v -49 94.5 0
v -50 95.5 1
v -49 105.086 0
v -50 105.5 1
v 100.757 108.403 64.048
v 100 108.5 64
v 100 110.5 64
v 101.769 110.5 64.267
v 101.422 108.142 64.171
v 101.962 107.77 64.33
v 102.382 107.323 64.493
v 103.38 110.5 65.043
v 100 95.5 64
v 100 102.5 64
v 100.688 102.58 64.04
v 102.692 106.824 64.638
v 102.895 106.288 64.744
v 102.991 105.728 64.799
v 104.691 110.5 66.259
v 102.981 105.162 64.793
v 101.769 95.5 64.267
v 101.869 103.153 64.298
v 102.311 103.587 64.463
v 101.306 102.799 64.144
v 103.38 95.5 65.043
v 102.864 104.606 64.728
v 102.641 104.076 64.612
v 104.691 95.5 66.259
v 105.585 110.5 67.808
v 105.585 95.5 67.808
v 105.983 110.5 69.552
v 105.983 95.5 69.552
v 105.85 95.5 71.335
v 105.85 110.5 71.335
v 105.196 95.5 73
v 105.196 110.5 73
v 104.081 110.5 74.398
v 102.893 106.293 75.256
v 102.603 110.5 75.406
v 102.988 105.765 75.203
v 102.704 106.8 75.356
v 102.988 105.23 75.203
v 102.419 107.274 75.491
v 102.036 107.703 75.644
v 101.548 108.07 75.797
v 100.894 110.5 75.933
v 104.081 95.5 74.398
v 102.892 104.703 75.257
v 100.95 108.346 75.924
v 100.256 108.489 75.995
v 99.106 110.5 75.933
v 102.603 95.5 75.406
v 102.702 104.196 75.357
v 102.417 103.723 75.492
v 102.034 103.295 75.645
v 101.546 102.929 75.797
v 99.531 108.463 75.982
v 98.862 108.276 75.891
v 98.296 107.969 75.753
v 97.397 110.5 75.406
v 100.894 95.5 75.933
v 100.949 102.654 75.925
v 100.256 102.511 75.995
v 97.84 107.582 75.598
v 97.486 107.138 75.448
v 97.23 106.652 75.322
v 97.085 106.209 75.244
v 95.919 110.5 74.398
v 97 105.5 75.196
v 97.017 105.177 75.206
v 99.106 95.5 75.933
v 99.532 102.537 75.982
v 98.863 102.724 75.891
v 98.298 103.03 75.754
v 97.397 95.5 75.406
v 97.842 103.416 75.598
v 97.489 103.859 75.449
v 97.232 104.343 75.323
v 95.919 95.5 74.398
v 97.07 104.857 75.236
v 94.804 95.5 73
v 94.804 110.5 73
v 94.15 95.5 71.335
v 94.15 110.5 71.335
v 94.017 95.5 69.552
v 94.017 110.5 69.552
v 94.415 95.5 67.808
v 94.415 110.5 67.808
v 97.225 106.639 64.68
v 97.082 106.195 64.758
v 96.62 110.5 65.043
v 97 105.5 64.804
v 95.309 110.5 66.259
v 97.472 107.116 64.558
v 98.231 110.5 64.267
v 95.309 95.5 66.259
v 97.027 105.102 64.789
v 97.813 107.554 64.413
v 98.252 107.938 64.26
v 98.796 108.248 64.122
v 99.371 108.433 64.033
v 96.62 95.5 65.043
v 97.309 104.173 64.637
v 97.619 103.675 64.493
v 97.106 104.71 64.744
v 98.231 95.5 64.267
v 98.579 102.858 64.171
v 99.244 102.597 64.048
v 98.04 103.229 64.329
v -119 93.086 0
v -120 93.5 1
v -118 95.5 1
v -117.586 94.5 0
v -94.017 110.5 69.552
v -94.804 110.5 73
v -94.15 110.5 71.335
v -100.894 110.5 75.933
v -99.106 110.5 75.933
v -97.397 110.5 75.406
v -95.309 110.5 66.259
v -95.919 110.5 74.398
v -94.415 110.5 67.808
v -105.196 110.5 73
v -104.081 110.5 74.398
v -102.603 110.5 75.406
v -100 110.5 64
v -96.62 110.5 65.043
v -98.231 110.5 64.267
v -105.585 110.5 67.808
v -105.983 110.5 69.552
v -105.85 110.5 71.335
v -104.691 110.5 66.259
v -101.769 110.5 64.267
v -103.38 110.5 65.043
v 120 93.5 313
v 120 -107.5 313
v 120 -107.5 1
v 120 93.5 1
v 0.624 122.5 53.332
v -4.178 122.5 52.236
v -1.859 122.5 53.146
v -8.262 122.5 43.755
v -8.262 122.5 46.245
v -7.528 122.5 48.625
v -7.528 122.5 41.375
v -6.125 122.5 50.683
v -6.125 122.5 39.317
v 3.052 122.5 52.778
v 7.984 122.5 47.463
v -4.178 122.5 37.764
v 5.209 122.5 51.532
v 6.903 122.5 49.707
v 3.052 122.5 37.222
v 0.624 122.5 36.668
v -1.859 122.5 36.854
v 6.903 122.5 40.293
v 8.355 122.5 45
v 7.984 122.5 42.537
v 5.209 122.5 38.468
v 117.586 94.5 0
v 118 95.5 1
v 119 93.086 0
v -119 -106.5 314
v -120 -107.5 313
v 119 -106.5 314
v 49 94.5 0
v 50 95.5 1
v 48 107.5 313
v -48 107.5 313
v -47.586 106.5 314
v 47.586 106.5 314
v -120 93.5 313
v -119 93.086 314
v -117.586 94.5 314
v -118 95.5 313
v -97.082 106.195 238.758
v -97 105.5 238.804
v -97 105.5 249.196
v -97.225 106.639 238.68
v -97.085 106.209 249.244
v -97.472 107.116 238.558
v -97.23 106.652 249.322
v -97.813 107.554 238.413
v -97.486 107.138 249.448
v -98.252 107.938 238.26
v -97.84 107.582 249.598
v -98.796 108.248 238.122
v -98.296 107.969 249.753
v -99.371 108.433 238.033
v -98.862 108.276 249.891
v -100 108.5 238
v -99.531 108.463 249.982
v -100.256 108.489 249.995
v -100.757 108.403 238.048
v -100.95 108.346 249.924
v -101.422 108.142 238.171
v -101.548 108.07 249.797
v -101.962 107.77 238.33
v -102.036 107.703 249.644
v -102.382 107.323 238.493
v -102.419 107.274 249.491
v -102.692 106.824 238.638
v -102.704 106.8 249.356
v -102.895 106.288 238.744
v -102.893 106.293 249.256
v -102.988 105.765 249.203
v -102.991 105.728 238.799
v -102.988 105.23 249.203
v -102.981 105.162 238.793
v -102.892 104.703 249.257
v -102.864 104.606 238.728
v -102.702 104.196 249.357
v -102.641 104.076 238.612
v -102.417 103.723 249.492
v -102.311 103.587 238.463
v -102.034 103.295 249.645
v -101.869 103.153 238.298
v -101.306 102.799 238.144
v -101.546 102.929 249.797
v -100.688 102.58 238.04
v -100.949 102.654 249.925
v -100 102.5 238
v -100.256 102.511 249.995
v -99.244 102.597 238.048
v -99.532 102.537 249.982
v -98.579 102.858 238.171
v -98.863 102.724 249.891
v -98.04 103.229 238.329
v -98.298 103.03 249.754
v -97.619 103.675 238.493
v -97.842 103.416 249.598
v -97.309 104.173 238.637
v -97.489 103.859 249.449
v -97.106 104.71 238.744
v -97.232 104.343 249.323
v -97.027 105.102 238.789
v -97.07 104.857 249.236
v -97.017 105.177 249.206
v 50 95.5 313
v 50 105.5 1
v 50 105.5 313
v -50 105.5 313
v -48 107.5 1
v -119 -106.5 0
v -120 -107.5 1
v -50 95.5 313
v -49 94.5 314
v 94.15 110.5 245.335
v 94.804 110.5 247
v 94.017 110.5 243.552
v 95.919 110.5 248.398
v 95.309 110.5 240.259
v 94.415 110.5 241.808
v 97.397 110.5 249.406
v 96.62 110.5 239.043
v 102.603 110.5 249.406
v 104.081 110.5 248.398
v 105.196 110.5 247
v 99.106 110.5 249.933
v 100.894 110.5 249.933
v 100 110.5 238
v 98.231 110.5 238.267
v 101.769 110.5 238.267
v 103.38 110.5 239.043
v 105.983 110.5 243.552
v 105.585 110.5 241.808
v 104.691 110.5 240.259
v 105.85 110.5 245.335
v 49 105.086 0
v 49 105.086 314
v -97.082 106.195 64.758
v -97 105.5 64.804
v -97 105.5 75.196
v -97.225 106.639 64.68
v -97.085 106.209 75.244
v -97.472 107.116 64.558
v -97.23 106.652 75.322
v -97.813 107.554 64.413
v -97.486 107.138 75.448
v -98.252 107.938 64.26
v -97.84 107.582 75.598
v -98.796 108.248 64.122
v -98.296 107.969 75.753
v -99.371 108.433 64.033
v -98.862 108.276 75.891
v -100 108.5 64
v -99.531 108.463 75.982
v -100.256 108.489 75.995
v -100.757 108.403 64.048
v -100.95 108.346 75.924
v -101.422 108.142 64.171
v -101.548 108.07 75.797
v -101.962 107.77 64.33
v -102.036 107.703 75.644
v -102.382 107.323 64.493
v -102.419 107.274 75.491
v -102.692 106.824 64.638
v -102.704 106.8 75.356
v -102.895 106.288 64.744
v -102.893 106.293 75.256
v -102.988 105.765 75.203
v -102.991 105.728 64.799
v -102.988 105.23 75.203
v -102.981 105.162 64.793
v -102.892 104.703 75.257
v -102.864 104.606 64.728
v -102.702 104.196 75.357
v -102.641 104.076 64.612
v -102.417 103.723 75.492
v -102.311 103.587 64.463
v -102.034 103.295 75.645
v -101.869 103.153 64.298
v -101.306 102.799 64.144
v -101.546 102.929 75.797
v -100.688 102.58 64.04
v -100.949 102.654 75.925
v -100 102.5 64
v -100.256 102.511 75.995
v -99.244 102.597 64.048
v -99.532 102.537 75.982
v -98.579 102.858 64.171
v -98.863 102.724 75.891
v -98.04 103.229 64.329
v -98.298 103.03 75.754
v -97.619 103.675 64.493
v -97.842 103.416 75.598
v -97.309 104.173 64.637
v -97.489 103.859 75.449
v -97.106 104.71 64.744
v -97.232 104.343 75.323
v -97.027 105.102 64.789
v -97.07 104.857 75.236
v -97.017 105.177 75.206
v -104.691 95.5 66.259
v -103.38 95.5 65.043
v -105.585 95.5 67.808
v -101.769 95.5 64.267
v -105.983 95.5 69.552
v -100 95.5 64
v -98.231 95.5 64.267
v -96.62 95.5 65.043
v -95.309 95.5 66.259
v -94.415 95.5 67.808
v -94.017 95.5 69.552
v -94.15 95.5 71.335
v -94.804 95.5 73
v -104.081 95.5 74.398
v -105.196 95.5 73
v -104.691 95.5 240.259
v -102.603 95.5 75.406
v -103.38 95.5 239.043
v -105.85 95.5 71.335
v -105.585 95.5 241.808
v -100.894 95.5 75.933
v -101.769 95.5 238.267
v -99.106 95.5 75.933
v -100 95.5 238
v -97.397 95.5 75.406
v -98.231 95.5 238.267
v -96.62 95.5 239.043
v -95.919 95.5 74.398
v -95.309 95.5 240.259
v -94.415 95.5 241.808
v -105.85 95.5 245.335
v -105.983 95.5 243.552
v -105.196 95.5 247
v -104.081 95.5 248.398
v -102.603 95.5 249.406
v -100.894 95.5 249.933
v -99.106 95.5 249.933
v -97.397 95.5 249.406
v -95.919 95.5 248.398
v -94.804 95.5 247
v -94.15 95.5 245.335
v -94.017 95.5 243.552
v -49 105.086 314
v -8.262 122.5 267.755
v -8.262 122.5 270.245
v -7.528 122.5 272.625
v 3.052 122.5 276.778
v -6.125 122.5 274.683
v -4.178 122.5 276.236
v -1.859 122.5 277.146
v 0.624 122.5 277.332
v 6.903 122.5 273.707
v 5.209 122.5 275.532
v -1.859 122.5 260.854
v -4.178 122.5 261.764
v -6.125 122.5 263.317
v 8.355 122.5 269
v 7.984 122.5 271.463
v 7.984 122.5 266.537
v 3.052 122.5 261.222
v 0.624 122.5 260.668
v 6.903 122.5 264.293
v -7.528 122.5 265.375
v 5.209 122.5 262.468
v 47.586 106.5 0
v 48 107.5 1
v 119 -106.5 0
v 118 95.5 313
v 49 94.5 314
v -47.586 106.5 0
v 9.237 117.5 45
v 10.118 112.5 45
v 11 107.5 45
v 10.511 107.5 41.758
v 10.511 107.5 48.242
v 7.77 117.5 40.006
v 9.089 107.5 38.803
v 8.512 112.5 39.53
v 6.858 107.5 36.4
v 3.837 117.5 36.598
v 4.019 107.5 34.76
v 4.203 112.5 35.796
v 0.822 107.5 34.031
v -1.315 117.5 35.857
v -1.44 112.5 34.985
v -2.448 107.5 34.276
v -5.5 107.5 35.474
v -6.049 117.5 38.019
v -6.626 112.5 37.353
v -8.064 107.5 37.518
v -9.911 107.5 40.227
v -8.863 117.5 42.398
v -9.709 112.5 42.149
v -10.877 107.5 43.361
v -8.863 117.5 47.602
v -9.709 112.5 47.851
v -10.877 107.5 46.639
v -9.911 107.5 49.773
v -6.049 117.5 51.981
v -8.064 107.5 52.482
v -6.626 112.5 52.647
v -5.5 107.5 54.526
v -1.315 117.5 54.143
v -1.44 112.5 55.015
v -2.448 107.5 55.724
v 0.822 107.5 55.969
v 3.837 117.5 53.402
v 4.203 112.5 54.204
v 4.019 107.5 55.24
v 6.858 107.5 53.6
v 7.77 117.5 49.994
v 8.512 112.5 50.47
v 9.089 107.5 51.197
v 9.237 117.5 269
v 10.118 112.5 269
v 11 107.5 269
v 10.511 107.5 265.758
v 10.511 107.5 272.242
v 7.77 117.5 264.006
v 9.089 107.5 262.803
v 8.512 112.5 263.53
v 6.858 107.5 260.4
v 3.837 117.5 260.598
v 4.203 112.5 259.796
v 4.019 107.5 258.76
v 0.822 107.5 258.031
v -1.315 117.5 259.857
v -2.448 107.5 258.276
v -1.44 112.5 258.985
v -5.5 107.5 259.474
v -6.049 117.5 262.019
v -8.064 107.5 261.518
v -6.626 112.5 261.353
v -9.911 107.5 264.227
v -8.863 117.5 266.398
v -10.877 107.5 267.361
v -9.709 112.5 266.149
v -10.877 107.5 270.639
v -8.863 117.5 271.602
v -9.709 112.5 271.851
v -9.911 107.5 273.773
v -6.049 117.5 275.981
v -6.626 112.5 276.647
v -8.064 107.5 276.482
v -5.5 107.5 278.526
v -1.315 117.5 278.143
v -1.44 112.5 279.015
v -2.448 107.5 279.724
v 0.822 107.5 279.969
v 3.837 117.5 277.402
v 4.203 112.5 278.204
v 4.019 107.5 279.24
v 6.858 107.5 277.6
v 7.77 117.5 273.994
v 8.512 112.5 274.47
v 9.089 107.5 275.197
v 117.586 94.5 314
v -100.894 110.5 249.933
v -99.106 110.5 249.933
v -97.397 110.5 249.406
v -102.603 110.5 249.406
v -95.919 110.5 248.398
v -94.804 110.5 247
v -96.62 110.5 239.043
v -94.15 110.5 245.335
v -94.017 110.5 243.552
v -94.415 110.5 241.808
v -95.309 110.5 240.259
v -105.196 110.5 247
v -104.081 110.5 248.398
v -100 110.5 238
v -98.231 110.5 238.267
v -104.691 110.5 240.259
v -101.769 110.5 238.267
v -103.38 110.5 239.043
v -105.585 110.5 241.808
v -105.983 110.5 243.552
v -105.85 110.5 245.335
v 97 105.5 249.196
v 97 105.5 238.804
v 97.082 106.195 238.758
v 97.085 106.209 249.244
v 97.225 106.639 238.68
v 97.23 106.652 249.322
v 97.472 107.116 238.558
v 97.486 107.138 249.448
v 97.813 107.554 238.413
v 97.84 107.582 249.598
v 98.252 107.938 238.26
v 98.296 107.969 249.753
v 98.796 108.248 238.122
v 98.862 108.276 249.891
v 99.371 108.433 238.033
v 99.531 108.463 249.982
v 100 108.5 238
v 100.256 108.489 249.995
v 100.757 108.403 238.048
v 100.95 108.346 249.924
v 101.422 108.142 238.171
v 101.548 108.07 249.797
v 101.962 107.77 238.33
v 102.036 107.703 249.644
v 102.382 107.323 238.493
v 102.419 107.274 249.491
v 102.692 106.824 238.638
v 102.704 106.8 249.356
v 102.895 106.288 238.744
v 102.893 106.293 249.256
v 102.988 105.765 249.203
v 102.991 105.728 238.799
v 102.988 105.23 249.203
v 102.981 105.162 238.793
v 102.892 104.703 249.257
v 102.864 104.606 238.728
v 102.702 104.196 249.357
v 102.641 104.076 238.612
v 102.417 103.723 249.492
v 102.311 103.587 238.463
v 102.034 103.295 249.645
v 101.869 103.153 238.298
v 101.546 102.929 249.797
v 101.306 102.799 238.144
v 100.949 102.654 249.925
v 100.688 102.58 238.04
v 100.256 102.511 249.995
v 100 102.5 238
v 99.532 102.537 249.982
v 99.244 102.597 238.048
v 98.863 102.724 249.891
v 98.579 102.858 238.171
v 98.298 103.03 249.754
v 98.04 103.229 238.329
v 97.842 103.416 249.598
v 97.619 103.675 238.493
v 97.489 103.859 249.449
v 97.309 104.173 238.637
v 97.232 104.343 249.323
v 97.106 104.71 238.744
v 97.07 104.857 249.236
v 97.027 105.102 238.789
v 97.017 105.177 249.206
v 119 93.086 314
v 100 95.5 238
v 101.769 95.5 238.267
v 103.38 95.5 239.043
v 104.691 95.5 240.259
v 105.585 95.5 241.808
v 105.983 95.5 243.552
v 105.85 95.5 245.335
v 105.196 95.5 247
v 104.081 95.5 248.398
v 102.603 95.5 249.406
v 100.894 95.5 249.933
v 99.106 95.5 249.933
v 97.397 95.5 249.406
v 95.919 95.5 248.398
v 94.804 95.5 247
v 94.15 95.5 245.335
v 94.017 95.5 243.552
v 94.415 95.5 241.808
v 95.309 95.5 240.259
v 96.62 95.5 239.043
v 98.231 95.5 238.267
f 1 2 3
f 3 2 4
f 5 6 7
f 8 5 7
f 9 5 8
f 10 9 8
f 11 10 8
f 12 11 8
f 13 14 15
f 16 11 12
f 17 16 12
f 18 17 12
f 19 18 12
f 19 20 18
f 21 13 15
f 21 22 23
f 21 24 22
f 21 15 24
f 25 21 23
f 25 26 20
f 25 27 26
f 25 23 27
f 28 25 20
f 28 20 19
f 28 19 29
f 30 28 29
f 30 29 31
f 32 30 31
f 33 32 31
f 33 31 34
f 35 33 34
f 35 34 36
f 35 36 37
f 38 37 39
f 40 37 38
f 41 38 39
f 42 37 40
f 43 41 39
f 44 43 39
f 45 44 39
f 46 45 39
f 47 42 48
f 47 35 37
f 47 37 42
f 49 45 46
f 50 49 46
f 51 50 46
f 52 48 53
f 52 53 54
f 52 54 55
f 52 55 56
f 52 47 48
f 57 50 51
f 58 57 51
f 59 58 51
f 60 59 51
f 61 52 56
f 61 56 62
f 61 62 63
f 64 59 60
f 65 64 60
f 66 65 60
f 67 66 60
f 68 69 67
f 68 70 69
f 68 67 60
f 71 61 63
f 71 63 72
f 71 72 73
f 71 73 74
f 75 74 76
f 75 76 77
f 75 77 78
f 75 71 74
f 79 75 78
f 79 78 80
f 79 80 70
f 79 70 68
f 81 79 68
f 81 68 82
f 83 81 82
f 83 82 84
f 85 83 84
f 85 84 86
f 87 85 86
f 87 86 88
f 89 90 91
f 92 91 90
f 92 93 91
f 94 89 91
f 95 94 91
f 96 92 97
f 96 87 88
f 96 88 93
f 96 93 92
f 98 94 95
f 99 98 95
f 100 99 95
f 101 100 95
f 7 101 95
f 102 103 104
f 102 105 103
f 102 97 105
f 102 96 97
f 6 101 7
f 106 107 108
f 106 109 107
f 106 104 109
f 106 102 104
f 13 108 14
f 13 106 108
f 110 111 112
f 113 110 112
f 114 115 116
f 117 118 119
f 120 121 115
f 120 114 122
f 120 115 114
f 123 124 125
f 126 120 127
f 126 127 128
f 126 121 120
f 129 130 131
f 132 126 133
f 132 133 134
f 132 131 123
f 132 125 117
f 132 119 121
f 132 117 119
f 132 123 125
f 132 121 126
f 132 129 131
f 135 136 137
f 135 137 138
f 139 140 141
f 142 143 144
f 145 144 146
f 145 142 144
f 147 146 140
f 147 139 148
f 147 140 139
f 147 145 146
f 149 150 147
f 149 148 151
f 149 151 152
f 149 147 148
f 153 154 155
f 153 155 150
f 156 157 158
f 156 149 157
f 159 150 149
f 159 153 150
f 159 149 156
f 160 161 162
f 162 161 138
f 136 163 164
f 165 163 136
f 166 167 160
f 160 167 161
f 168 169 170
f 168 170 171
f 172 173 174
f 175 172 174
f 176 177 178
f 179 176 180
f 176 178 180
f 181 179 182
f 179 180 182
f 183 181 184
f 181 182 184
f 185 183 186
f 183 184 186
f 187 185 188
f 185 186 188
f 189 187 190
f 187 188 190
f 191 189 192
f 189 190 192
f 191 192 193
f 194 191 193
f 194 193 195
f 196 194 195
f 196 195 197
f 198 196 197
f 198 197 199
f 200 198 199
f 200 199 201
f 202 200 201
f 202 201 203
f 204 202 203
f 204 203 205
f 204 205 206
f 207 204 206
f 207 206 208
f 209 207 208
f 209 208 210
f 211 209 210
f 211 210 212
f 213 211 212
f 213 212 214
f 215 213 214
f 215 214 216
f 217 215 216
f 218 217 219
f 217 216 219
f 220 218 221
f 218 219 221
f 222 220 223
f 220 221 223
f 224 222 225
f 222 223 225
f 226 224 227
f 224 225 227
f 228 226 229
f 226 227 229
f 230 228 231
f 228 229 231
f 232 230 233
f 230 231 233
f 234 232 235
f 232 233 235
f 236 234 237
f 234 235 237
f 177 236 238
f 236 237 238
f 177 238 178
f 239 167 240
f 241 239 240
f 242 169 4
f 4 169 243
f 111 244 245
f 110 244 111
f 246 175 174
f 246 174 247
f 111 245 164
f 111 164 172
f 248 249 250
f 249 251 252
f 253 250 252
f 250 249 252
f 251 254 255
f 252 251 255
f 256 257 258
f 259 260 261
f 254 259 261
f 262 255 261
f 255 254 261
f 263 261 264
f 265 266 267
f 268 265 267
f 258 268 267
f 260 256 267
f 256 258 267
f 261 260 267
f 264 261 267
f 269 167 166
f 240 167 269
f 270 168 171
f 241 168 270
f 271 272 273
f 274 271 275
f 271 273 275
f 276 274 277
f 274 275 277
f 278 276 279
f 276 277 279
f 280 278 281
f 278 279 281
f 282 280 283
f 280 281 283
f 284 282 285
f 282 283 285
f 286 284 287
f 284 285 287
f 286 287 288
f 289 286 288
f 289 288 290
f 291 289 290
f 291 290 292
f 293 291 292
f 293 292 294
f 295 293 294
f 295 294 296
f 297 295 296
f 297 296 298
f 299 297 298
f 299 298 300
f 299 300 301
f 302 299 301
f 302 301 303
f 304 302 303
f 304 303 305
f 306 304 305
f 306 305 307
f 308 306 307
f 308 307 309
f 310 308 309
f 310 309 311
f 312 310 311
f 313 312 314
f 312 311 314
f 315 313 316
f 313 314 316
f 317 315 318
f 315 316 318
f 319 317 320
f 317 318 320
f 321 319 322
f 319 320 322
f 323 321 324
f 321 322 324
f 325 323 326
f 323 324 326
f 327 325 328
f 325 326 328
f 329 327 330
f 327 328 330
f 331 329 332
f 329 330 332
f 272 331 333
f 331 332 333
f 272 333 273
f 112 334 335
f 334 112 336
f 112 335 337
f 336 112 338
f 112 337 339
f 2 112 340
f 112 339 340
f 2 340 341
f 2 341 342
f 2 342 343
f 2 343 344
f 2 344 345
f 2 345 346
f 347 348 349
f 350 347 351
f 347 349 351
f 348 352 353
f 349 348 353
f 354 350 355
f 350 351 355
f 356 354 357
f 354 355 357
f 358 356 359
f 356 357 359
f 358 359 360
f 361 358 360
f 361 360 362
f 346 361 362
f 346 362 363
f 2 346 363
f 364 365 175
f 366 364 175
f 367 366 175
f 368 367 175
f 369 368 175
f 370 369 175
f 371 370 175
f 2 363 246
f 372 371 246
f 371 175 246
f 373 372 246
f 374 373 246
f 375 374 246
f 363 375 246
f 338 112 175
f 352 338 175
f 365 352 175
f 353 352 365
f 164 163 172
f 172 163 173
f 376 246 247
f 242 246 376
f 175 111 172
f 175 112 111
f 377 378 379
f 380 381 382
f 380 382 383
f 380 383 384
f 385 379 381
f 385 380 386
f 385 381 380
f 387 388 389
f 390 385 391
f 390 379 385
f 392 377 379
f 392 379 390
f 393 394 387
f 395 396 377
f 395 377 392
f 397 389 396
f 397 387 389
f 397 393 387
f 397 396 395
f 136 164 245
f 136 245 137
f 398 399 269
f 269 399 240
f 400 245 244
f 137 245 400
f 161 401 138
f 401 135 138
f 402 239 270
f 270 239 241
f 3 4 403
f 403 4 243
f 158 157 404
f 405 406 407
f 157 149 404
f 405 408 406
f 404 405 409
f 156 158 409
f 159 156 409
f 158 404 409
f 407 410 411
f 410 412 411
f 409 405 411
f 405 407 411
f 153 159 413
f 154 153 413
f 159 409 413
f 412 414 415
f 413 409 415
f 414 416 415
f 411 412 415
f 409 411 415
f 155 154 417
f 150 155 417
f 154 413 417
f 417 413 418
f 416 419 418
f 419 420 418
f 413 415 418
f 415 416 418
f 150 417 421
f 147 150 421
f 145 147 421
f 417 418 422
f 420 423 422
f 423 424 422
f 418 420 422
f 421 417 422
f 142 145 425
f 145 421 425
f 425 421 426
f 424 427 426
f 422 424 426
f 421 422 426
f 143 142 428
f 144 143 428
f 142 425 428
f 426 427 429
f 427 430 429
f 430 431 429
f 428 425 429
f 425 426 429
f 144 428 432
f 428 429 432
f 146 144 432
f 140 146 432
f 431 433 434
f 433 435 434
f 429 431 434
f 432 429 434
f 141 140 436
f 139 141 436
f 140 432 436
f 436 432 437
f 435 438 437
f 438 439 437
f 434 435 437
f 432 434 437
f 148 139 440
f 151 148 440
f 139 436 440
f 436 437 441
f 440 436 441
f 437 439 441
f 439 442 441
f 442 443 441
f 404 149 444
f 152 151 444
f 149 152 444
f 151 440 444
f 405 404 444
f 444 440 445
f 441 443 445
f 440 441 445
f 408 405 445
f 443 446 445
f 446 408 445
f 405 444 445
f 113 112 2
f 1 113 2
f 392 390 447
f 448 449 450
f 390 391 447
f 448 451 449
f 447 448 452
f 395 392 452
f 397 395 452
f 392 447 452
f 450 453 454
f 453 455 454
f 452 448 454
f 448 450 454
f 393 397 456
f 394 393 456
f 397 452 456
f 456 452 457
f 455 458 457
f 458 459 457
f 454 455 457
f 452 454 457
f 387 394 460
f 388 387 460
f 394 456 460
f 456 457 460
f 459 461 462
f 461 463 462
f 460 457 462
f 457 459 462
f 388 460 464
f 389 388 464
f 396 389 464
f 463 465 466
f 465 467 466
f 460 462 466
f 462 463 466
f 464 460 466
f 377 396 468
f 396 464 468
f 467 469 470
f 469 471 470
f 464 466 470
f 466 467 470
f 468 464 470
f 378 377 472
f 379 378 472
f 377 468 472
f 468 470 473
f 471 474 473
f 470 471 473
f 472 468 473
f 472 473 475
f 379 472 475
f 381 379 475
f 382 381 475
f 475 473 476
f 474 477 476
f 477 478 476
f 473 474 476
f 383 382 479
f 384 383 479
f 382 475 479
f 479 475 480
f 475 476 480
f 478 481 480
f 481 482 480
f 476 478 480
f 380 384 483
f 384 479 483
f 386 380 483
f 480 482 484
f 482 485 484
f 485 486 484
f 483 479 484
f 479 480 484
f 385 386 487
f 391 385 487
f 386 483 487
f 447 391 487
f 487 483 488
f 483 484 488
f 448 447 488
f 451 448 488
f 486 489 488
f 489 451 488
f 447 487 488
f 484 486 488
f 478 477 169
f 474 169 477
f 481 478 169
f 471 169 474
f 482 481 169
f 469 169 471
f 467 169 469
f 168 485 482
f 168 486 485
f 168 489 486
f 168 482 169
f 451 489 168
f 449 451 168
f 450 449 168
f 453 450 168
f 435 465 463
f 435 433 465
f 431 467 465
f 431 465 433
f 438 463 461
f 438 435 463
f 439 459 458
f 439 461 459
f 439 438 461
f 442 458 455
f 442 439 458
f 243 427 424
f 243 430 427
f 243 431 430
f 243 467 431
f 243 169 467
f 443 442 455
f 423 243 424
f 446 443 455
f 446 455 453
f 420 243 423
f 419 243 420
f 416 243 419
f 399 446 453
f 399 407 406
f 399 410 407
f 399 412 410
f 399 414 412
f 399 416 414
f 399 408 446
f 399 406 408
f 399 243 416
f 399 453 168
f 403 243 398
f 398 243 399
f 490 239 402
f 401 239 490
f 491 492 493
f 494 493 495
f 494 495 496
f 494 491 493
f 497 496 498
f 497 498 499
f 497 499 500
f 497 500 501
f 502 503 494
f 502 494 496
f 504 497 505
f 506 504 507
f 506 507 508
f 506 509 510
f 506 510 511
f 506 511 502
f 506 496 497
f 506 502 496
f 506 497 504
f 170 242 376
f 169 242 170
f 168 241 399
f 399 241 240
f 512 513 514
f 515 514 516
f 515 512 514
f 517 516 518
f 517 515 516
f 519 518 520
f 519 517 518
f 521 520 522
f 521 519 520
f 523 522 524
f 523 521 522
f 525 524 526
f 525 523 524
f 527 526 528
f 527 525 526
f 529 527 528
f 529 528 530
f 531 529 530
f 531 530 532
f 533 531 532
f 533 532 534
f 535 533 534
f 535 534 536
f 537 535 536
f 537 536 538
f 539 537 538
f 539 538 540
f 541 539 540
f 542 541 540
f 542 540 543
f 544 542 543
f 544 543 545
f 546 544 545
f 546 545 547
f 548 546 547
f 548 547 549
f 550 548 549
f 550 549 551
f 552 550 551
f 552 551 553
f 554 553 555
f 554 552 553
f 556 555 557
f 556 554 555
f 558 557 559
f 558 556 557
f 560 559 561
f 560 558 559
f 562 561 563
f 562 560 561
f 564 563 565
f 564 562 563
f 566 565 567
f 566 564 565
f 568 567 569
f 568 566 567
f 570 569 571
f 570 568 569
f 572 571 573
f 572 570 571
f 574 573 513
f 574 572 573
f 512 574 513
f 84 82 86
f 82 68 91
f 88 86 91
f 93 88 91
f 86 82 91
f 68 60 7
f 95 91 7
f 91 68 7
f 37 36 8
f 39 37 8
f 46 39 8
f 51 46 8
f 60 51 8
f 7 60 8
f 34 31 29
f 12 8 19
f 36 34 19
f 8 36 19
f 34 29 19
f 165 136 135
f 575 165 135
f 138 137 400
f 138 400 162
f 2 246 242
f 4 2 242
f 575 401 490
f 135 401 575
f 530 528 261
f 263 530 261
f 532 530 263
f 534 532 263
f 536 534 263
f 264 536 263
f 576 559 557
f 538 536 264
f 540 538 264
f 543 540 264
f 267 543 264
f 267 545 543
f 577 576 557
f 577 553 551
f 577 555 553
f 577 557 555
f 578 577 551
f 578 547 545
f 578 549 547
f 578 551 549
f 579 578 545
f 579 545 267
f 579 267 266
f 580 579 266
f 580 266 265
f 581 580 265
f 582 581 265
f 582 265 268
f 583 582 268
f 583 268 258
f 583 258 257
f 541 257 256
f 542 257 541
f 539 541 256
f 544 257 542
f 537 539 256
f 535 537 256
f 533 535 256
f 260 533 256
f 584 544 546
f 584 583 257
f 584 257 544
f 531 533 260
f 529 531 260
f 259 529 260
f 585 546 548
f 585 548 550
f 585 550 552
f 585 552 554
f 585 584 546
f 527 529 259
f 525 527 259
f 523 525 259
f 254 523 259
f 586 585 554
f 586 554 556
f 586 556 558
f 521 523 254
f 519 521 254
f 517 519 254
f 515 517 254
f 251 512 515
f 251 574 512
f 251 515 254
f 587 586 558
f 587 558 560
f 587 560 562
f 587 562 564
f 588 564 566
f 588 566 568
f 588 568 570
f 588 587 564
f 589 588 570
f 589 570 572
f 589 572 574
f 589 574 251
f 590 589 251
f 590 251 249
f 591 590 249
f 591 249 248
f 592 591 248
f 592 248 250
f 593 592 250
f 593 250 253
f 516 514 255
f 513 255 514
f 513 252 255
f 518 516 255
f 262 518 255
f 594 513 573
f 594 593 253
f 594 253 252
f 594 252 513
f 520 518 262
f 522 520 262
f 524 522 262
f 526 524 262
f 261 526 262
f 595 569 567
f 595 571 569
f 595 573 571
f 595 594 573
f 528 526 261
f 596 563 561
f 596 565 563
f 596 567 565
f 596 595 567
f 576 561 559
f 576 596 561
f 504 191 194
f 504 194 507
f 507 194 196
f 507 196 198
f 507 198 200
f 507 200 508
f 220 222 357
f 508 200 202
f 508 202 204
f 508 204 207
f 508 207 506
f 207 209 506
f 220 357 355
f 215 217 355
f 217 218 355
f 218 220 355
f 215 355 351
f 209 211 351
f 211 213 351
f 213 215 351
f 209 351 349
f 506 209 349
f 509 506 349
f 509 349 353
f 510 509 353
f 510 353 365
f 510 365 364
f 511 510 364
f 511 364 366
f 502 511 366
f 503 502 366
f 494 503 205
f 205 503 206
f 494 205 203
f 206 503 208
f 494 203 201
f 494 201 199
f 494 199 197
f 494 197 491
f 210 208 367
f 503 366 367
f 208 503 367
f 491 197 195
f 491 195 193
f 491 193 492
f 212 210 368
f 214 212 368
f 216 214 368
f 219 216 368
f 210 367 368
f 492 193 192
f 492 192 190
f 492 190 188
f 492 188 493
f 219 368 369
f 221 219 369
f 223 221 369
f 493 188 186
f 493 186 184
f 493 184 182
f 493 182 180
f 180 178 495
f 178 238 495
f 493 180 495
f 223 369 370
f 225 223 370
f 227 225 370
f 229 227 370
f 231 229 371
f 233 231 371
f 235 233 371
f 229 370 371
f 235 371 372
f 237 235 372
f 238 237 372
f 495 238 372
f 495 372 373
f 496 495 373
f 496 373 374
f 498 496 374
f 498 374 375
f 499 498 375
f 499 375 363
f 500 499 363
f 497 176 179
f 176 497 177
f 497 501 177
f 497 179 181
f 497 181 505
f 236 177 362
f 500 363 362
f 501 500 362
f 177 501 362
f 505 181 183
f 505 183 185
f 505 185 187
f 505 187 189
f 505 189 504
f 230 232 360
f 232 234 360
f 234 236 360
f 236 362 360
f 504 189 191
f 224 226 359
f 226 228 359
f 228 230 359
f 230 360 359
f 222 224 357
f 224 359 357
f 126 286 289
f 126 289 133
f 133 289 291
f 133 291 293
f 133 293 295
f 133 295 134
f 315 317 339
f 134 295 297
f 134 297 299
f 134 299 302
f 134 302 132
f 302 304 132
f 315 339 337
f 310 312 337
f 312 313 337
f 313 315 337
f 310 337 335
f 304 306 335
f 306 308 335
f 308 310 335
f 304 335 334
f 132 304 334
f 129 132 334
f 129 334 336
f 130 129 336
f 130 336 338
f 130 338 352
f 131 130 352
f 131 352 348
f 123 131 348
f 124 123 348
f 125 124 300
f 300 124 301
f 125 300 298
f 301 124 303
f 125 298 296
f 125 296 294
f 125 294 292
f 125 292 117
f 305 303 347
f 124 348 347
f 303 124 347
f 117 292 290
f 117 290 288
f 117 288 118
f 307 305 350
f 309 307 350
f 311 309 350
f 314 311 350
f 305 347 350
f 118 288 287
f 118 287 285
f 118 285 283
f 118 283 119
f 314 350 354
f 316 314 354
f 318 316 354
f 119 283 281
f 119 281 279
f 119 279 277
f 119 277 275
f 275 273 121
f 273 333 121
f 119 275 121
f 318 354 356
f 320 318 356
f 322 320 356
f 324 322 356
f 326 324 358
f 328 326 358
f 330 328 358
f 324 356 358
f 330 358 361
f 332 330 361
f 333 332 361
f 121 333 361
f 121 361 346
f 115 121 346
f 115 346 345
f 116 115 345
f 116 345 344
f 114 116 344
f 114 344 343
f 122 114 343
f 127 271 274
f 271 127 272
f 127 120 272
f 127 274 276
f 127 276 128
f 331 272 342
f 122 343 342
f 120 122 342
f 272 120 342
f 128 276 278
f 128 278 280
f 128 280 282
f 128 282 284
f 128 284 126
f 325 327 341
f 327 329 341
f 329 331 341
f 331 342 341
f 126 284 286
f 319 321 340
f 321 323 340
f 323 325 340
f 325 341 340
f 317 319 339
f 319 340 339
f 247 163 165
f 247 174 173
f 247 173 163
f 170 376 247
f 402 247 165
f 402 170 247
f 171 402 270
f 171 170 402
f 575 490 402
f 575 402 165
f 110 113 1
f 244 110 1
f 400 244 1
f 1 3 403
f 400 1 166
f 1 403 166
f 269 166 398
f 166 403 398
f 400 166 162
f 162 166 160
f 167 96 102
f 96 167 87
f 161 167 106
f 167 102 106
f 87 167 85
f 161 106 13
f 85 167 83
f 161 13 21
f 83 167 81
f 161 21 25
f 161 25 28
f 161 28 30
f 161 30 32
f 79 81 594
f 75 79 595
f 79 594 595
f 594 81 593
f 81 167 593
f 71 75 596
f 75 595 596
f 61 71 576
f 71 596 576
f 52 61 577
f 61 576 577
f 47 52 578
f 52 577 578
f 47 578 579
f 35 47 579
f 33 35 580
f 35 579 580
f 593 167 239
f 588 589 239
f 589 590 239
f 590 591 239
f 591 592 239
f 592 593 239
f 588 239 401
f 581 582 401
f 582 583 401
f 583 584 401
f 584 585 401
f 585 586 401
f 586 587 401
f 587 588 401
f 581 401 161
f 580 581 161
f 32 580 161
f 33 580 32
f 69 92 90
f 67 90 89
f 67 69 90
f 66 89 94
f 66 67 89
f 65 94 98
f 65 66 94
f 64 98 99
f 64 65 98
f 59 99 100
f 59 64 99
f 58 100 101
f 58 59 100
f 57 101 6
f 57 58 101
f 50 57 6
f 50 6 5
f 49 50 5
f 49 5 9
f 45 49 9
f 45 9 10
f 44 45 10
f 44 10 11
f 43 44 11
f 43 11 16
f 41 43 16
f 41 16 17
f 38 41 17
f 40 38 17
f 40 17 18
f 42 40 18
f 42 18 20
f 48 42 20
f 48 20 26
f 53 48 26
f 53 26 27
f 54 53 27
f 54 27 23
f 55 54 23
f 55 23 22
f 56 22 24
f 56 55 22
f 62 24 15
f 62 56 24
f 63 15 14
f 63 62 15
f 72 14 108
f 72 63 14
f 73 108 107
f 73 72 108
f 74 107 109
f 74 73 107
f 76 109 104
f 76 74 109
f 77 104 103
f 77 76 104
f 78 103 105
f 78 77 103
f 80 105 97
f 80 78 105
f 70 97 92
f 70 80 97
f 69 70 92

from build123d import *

# Parameters (mm, degrees)
SKETCH_1_W                = 240
SKETCH_1_H                = 215
EXTRUDE_1_DEPTH           = 314
SKETCH_2_W                = 93.930111424
SKETCH_2_H                = 33.454560233
SKETCH_2_W_2              = 70
SKETCH_2_H_2              = 30.443707166
CUT_EXTRUDE_1_DEPTH       = 353.91960841
CHAMFER_1_SIZE            = 2
SKETCH_3_R                = 6
EXTRUDE_2_DEPTH           = 15
SKETCH_4_R                = 3
CUT_EXTRUDE_2_DEPTH       = 354.844951921
SKETCH_5_R                = 11
EXTRUDE_3_DEPTH           = 15
EXTRUDE_3_DRAFT           = 10
EXTRUDE_3_PROFILE_2_DEPTH = 15
EXTRUDE_3_PROFILE_2_DRAFT = 10
CHAMFER_2_SIZE            = 1


with BuildPart() as part:
    # 草图1 → 凸台-拉伸1 (new body)
    with BuildSketch(Plane.XY):
        Rectangle(SKETCH_1_W, SKETCH_1_H)
    extrude(amount=EXTRUDE_1_DEPTH)

    # 草图2 → 切除-拉伸1 (cut, through all)
    with BuildSketch(Plane.XY.offset(314)):
        with Locations((-96.965055712, 112.227280116)):
            Rectangle(SKETCH_2_W, SKETCH_2_H)
        with Locations((85, 110.721853583)):
            Rectangle(SKETCH_2_W_2, SKETCH_2_H_2)
    extrude(amount=-CUT_EXTRUDE_1_DEPTH, mode=Mode.SUBTRACT)

    # 倒角1
    chamfer_1_edges = [part.edges().sort_by_distance(p)[0] for p in [
        (-50, 107.5, 157),
        (-120, 95.5, 157),
        (50, 107.5, 157),
        (120, 95.5, 157),
    ]]
    chamfer(chamfer_1_edges, length=CHAMFER_1_SIZE)

    # 草图3 → 凸台-拉伸2 (add)
    with BuildSketch(Plane(origin=(0, 95.5, 0), x_dir=(1, 0, 0), z_dir=(0, 1, 0))):
        with Locations(Location((-100, -70, 0), (0, 0, 90))):
            Circle(SKETCH_3_R)
        with Locations(Location((-100, -244, 0), (0, 0, 90))):
            Circle(SKETCH_3_R)
    extrude_2 = extrude(amount=EXTRUDE_2_DEPTH)

    # 草图4 → 切除-拉伸2 (cut, through all)
    with BuildSketch(Plane.XY.offset(314)):
        with Locations((-100, 105.5)):
            Circle(SKETCH_4_R)
    cut_extrude_2 = extrude(amount=-CUT_EXTRUDE_2_DEPTH, mode=Mode.SUBTRACT)


with BuildPart() as extrude_3_tool:
    # 草图5 → 凸台-拉伸3 (with draft: the straight prism first)
    with BuildSketch(Plane(origin=(0, 107.5, 0), x_dir=(1, 0, 0), z_dir=(0, 1, 0))):
        with Locations((0, -45)):
            Circle(SKETCH_5_R)
    extrude(amount=EXTRUDE_3_DEPTH)
    # 凸台-拉伸3: the draft: its side faces are tilted about the plane it starts from
    extrude_3_sides = [extrude_3_tool.faces().sort_by_distance(p)[0] for p in [
        (-11, 115, 45),
    ]]
    draft(extrude_3_sides, Plane(origin=(0, 107.5, 0), x_dir=(1, 0, 0), z_dir=(0, 1, 0)), EXTRUDE_3_DRAFT)


with BuildPart() as part_1:
    add(part.part)

    # 凸台-拉伸3: add extrude_3_tool
    add(extrude_3_tool.part)


with BuildPart() as extrude_3_profile_2_tool:
    # 草图5 → 凸台-拉伸3 profile 2 (with draft: the straight prism first)
    with BuildSketch(Plane(origin=(0, 107.5, 0), x_dir=(1, 0, 0), z_dir=(0, 1, 0))):
        with Locations((0, -269)):
            Circle(SKETCH_5_R)
    extrude(amount=EXTRUDE_3_PROFILE_2_DEPTH)
    # 凸台-拉伸3 profile 2: the draft: its side faces are tilted about the plane it starts from
    extrude_3_profile_2_sides = [extrude_3_profile_2_tool.faces().sort_by_distance(p)[0] for p in [
        (-11, 115, 269),
    ]]
    draft(extrude_3_profile_2_sides, Plane(origin=(0, 107.5, 0), x_dir=(1, 0, 0), z_dir=(0, 1, 0)), EXTRUDE_3_PROFILE_2_DRAFT)


with BuildPart() as part_2:
    add(part_1.part)

    # 凸台-拉伸3 profile 2: add extrude_3_profile_2_tool
    add(extrude_3_profile_2_tool.part)

    # 镜向1: 凸台-拉伸2, 切除-拉伸2 across plane
    add(extrude_2.mirror(Plane(origin=(0, 0, 0), x_dir=(0, 0, 1), z_dir=(1, 0, 0))))
    add(cut_extrude_2.mirror(Plane(origin=(0, 0, 0), x_dir=(0, 0, 1), z_dir=(1, 0, 0))), mode=Mode.SUBTRACT)

    # 倒角2
    chamfer_2_edges = [part_2.edges().sort_by_distance(p)[0] for p in [
        (0, -107.5, 314),
        (-84, 95.5, 0),
        (-50, 100.5, 314),
        (-50, 100.5, 0),
        (50, 100.5, 0),
        (84, 95.5, 314),
        (84, 95.5, 0),
        (120, -7, 314),
        (0, -107.5, 0),
        (-120, -7, 314),
        (-120, -7, 0),
        (0, 107.5, 0),
        (-49, 106.5, 0),
        (49, 106.5, 0),
        (119, 94.5, 0),
        (-119, 94.5, 0),
        (-84, 95.5, 314),
        (120, -7, 0),
        (50, 100.5, 314),
        (0, 107.5, 314),
        (-49, 106.5, 314),
        (49, 106.5, 314),
        (119, 94.5, 314),
        (-119, 94.5, 314),
    ]]
    chamfer(chamfer_2_edges, length=CHAMFER_2_SIZE)


solid = part_2.part
